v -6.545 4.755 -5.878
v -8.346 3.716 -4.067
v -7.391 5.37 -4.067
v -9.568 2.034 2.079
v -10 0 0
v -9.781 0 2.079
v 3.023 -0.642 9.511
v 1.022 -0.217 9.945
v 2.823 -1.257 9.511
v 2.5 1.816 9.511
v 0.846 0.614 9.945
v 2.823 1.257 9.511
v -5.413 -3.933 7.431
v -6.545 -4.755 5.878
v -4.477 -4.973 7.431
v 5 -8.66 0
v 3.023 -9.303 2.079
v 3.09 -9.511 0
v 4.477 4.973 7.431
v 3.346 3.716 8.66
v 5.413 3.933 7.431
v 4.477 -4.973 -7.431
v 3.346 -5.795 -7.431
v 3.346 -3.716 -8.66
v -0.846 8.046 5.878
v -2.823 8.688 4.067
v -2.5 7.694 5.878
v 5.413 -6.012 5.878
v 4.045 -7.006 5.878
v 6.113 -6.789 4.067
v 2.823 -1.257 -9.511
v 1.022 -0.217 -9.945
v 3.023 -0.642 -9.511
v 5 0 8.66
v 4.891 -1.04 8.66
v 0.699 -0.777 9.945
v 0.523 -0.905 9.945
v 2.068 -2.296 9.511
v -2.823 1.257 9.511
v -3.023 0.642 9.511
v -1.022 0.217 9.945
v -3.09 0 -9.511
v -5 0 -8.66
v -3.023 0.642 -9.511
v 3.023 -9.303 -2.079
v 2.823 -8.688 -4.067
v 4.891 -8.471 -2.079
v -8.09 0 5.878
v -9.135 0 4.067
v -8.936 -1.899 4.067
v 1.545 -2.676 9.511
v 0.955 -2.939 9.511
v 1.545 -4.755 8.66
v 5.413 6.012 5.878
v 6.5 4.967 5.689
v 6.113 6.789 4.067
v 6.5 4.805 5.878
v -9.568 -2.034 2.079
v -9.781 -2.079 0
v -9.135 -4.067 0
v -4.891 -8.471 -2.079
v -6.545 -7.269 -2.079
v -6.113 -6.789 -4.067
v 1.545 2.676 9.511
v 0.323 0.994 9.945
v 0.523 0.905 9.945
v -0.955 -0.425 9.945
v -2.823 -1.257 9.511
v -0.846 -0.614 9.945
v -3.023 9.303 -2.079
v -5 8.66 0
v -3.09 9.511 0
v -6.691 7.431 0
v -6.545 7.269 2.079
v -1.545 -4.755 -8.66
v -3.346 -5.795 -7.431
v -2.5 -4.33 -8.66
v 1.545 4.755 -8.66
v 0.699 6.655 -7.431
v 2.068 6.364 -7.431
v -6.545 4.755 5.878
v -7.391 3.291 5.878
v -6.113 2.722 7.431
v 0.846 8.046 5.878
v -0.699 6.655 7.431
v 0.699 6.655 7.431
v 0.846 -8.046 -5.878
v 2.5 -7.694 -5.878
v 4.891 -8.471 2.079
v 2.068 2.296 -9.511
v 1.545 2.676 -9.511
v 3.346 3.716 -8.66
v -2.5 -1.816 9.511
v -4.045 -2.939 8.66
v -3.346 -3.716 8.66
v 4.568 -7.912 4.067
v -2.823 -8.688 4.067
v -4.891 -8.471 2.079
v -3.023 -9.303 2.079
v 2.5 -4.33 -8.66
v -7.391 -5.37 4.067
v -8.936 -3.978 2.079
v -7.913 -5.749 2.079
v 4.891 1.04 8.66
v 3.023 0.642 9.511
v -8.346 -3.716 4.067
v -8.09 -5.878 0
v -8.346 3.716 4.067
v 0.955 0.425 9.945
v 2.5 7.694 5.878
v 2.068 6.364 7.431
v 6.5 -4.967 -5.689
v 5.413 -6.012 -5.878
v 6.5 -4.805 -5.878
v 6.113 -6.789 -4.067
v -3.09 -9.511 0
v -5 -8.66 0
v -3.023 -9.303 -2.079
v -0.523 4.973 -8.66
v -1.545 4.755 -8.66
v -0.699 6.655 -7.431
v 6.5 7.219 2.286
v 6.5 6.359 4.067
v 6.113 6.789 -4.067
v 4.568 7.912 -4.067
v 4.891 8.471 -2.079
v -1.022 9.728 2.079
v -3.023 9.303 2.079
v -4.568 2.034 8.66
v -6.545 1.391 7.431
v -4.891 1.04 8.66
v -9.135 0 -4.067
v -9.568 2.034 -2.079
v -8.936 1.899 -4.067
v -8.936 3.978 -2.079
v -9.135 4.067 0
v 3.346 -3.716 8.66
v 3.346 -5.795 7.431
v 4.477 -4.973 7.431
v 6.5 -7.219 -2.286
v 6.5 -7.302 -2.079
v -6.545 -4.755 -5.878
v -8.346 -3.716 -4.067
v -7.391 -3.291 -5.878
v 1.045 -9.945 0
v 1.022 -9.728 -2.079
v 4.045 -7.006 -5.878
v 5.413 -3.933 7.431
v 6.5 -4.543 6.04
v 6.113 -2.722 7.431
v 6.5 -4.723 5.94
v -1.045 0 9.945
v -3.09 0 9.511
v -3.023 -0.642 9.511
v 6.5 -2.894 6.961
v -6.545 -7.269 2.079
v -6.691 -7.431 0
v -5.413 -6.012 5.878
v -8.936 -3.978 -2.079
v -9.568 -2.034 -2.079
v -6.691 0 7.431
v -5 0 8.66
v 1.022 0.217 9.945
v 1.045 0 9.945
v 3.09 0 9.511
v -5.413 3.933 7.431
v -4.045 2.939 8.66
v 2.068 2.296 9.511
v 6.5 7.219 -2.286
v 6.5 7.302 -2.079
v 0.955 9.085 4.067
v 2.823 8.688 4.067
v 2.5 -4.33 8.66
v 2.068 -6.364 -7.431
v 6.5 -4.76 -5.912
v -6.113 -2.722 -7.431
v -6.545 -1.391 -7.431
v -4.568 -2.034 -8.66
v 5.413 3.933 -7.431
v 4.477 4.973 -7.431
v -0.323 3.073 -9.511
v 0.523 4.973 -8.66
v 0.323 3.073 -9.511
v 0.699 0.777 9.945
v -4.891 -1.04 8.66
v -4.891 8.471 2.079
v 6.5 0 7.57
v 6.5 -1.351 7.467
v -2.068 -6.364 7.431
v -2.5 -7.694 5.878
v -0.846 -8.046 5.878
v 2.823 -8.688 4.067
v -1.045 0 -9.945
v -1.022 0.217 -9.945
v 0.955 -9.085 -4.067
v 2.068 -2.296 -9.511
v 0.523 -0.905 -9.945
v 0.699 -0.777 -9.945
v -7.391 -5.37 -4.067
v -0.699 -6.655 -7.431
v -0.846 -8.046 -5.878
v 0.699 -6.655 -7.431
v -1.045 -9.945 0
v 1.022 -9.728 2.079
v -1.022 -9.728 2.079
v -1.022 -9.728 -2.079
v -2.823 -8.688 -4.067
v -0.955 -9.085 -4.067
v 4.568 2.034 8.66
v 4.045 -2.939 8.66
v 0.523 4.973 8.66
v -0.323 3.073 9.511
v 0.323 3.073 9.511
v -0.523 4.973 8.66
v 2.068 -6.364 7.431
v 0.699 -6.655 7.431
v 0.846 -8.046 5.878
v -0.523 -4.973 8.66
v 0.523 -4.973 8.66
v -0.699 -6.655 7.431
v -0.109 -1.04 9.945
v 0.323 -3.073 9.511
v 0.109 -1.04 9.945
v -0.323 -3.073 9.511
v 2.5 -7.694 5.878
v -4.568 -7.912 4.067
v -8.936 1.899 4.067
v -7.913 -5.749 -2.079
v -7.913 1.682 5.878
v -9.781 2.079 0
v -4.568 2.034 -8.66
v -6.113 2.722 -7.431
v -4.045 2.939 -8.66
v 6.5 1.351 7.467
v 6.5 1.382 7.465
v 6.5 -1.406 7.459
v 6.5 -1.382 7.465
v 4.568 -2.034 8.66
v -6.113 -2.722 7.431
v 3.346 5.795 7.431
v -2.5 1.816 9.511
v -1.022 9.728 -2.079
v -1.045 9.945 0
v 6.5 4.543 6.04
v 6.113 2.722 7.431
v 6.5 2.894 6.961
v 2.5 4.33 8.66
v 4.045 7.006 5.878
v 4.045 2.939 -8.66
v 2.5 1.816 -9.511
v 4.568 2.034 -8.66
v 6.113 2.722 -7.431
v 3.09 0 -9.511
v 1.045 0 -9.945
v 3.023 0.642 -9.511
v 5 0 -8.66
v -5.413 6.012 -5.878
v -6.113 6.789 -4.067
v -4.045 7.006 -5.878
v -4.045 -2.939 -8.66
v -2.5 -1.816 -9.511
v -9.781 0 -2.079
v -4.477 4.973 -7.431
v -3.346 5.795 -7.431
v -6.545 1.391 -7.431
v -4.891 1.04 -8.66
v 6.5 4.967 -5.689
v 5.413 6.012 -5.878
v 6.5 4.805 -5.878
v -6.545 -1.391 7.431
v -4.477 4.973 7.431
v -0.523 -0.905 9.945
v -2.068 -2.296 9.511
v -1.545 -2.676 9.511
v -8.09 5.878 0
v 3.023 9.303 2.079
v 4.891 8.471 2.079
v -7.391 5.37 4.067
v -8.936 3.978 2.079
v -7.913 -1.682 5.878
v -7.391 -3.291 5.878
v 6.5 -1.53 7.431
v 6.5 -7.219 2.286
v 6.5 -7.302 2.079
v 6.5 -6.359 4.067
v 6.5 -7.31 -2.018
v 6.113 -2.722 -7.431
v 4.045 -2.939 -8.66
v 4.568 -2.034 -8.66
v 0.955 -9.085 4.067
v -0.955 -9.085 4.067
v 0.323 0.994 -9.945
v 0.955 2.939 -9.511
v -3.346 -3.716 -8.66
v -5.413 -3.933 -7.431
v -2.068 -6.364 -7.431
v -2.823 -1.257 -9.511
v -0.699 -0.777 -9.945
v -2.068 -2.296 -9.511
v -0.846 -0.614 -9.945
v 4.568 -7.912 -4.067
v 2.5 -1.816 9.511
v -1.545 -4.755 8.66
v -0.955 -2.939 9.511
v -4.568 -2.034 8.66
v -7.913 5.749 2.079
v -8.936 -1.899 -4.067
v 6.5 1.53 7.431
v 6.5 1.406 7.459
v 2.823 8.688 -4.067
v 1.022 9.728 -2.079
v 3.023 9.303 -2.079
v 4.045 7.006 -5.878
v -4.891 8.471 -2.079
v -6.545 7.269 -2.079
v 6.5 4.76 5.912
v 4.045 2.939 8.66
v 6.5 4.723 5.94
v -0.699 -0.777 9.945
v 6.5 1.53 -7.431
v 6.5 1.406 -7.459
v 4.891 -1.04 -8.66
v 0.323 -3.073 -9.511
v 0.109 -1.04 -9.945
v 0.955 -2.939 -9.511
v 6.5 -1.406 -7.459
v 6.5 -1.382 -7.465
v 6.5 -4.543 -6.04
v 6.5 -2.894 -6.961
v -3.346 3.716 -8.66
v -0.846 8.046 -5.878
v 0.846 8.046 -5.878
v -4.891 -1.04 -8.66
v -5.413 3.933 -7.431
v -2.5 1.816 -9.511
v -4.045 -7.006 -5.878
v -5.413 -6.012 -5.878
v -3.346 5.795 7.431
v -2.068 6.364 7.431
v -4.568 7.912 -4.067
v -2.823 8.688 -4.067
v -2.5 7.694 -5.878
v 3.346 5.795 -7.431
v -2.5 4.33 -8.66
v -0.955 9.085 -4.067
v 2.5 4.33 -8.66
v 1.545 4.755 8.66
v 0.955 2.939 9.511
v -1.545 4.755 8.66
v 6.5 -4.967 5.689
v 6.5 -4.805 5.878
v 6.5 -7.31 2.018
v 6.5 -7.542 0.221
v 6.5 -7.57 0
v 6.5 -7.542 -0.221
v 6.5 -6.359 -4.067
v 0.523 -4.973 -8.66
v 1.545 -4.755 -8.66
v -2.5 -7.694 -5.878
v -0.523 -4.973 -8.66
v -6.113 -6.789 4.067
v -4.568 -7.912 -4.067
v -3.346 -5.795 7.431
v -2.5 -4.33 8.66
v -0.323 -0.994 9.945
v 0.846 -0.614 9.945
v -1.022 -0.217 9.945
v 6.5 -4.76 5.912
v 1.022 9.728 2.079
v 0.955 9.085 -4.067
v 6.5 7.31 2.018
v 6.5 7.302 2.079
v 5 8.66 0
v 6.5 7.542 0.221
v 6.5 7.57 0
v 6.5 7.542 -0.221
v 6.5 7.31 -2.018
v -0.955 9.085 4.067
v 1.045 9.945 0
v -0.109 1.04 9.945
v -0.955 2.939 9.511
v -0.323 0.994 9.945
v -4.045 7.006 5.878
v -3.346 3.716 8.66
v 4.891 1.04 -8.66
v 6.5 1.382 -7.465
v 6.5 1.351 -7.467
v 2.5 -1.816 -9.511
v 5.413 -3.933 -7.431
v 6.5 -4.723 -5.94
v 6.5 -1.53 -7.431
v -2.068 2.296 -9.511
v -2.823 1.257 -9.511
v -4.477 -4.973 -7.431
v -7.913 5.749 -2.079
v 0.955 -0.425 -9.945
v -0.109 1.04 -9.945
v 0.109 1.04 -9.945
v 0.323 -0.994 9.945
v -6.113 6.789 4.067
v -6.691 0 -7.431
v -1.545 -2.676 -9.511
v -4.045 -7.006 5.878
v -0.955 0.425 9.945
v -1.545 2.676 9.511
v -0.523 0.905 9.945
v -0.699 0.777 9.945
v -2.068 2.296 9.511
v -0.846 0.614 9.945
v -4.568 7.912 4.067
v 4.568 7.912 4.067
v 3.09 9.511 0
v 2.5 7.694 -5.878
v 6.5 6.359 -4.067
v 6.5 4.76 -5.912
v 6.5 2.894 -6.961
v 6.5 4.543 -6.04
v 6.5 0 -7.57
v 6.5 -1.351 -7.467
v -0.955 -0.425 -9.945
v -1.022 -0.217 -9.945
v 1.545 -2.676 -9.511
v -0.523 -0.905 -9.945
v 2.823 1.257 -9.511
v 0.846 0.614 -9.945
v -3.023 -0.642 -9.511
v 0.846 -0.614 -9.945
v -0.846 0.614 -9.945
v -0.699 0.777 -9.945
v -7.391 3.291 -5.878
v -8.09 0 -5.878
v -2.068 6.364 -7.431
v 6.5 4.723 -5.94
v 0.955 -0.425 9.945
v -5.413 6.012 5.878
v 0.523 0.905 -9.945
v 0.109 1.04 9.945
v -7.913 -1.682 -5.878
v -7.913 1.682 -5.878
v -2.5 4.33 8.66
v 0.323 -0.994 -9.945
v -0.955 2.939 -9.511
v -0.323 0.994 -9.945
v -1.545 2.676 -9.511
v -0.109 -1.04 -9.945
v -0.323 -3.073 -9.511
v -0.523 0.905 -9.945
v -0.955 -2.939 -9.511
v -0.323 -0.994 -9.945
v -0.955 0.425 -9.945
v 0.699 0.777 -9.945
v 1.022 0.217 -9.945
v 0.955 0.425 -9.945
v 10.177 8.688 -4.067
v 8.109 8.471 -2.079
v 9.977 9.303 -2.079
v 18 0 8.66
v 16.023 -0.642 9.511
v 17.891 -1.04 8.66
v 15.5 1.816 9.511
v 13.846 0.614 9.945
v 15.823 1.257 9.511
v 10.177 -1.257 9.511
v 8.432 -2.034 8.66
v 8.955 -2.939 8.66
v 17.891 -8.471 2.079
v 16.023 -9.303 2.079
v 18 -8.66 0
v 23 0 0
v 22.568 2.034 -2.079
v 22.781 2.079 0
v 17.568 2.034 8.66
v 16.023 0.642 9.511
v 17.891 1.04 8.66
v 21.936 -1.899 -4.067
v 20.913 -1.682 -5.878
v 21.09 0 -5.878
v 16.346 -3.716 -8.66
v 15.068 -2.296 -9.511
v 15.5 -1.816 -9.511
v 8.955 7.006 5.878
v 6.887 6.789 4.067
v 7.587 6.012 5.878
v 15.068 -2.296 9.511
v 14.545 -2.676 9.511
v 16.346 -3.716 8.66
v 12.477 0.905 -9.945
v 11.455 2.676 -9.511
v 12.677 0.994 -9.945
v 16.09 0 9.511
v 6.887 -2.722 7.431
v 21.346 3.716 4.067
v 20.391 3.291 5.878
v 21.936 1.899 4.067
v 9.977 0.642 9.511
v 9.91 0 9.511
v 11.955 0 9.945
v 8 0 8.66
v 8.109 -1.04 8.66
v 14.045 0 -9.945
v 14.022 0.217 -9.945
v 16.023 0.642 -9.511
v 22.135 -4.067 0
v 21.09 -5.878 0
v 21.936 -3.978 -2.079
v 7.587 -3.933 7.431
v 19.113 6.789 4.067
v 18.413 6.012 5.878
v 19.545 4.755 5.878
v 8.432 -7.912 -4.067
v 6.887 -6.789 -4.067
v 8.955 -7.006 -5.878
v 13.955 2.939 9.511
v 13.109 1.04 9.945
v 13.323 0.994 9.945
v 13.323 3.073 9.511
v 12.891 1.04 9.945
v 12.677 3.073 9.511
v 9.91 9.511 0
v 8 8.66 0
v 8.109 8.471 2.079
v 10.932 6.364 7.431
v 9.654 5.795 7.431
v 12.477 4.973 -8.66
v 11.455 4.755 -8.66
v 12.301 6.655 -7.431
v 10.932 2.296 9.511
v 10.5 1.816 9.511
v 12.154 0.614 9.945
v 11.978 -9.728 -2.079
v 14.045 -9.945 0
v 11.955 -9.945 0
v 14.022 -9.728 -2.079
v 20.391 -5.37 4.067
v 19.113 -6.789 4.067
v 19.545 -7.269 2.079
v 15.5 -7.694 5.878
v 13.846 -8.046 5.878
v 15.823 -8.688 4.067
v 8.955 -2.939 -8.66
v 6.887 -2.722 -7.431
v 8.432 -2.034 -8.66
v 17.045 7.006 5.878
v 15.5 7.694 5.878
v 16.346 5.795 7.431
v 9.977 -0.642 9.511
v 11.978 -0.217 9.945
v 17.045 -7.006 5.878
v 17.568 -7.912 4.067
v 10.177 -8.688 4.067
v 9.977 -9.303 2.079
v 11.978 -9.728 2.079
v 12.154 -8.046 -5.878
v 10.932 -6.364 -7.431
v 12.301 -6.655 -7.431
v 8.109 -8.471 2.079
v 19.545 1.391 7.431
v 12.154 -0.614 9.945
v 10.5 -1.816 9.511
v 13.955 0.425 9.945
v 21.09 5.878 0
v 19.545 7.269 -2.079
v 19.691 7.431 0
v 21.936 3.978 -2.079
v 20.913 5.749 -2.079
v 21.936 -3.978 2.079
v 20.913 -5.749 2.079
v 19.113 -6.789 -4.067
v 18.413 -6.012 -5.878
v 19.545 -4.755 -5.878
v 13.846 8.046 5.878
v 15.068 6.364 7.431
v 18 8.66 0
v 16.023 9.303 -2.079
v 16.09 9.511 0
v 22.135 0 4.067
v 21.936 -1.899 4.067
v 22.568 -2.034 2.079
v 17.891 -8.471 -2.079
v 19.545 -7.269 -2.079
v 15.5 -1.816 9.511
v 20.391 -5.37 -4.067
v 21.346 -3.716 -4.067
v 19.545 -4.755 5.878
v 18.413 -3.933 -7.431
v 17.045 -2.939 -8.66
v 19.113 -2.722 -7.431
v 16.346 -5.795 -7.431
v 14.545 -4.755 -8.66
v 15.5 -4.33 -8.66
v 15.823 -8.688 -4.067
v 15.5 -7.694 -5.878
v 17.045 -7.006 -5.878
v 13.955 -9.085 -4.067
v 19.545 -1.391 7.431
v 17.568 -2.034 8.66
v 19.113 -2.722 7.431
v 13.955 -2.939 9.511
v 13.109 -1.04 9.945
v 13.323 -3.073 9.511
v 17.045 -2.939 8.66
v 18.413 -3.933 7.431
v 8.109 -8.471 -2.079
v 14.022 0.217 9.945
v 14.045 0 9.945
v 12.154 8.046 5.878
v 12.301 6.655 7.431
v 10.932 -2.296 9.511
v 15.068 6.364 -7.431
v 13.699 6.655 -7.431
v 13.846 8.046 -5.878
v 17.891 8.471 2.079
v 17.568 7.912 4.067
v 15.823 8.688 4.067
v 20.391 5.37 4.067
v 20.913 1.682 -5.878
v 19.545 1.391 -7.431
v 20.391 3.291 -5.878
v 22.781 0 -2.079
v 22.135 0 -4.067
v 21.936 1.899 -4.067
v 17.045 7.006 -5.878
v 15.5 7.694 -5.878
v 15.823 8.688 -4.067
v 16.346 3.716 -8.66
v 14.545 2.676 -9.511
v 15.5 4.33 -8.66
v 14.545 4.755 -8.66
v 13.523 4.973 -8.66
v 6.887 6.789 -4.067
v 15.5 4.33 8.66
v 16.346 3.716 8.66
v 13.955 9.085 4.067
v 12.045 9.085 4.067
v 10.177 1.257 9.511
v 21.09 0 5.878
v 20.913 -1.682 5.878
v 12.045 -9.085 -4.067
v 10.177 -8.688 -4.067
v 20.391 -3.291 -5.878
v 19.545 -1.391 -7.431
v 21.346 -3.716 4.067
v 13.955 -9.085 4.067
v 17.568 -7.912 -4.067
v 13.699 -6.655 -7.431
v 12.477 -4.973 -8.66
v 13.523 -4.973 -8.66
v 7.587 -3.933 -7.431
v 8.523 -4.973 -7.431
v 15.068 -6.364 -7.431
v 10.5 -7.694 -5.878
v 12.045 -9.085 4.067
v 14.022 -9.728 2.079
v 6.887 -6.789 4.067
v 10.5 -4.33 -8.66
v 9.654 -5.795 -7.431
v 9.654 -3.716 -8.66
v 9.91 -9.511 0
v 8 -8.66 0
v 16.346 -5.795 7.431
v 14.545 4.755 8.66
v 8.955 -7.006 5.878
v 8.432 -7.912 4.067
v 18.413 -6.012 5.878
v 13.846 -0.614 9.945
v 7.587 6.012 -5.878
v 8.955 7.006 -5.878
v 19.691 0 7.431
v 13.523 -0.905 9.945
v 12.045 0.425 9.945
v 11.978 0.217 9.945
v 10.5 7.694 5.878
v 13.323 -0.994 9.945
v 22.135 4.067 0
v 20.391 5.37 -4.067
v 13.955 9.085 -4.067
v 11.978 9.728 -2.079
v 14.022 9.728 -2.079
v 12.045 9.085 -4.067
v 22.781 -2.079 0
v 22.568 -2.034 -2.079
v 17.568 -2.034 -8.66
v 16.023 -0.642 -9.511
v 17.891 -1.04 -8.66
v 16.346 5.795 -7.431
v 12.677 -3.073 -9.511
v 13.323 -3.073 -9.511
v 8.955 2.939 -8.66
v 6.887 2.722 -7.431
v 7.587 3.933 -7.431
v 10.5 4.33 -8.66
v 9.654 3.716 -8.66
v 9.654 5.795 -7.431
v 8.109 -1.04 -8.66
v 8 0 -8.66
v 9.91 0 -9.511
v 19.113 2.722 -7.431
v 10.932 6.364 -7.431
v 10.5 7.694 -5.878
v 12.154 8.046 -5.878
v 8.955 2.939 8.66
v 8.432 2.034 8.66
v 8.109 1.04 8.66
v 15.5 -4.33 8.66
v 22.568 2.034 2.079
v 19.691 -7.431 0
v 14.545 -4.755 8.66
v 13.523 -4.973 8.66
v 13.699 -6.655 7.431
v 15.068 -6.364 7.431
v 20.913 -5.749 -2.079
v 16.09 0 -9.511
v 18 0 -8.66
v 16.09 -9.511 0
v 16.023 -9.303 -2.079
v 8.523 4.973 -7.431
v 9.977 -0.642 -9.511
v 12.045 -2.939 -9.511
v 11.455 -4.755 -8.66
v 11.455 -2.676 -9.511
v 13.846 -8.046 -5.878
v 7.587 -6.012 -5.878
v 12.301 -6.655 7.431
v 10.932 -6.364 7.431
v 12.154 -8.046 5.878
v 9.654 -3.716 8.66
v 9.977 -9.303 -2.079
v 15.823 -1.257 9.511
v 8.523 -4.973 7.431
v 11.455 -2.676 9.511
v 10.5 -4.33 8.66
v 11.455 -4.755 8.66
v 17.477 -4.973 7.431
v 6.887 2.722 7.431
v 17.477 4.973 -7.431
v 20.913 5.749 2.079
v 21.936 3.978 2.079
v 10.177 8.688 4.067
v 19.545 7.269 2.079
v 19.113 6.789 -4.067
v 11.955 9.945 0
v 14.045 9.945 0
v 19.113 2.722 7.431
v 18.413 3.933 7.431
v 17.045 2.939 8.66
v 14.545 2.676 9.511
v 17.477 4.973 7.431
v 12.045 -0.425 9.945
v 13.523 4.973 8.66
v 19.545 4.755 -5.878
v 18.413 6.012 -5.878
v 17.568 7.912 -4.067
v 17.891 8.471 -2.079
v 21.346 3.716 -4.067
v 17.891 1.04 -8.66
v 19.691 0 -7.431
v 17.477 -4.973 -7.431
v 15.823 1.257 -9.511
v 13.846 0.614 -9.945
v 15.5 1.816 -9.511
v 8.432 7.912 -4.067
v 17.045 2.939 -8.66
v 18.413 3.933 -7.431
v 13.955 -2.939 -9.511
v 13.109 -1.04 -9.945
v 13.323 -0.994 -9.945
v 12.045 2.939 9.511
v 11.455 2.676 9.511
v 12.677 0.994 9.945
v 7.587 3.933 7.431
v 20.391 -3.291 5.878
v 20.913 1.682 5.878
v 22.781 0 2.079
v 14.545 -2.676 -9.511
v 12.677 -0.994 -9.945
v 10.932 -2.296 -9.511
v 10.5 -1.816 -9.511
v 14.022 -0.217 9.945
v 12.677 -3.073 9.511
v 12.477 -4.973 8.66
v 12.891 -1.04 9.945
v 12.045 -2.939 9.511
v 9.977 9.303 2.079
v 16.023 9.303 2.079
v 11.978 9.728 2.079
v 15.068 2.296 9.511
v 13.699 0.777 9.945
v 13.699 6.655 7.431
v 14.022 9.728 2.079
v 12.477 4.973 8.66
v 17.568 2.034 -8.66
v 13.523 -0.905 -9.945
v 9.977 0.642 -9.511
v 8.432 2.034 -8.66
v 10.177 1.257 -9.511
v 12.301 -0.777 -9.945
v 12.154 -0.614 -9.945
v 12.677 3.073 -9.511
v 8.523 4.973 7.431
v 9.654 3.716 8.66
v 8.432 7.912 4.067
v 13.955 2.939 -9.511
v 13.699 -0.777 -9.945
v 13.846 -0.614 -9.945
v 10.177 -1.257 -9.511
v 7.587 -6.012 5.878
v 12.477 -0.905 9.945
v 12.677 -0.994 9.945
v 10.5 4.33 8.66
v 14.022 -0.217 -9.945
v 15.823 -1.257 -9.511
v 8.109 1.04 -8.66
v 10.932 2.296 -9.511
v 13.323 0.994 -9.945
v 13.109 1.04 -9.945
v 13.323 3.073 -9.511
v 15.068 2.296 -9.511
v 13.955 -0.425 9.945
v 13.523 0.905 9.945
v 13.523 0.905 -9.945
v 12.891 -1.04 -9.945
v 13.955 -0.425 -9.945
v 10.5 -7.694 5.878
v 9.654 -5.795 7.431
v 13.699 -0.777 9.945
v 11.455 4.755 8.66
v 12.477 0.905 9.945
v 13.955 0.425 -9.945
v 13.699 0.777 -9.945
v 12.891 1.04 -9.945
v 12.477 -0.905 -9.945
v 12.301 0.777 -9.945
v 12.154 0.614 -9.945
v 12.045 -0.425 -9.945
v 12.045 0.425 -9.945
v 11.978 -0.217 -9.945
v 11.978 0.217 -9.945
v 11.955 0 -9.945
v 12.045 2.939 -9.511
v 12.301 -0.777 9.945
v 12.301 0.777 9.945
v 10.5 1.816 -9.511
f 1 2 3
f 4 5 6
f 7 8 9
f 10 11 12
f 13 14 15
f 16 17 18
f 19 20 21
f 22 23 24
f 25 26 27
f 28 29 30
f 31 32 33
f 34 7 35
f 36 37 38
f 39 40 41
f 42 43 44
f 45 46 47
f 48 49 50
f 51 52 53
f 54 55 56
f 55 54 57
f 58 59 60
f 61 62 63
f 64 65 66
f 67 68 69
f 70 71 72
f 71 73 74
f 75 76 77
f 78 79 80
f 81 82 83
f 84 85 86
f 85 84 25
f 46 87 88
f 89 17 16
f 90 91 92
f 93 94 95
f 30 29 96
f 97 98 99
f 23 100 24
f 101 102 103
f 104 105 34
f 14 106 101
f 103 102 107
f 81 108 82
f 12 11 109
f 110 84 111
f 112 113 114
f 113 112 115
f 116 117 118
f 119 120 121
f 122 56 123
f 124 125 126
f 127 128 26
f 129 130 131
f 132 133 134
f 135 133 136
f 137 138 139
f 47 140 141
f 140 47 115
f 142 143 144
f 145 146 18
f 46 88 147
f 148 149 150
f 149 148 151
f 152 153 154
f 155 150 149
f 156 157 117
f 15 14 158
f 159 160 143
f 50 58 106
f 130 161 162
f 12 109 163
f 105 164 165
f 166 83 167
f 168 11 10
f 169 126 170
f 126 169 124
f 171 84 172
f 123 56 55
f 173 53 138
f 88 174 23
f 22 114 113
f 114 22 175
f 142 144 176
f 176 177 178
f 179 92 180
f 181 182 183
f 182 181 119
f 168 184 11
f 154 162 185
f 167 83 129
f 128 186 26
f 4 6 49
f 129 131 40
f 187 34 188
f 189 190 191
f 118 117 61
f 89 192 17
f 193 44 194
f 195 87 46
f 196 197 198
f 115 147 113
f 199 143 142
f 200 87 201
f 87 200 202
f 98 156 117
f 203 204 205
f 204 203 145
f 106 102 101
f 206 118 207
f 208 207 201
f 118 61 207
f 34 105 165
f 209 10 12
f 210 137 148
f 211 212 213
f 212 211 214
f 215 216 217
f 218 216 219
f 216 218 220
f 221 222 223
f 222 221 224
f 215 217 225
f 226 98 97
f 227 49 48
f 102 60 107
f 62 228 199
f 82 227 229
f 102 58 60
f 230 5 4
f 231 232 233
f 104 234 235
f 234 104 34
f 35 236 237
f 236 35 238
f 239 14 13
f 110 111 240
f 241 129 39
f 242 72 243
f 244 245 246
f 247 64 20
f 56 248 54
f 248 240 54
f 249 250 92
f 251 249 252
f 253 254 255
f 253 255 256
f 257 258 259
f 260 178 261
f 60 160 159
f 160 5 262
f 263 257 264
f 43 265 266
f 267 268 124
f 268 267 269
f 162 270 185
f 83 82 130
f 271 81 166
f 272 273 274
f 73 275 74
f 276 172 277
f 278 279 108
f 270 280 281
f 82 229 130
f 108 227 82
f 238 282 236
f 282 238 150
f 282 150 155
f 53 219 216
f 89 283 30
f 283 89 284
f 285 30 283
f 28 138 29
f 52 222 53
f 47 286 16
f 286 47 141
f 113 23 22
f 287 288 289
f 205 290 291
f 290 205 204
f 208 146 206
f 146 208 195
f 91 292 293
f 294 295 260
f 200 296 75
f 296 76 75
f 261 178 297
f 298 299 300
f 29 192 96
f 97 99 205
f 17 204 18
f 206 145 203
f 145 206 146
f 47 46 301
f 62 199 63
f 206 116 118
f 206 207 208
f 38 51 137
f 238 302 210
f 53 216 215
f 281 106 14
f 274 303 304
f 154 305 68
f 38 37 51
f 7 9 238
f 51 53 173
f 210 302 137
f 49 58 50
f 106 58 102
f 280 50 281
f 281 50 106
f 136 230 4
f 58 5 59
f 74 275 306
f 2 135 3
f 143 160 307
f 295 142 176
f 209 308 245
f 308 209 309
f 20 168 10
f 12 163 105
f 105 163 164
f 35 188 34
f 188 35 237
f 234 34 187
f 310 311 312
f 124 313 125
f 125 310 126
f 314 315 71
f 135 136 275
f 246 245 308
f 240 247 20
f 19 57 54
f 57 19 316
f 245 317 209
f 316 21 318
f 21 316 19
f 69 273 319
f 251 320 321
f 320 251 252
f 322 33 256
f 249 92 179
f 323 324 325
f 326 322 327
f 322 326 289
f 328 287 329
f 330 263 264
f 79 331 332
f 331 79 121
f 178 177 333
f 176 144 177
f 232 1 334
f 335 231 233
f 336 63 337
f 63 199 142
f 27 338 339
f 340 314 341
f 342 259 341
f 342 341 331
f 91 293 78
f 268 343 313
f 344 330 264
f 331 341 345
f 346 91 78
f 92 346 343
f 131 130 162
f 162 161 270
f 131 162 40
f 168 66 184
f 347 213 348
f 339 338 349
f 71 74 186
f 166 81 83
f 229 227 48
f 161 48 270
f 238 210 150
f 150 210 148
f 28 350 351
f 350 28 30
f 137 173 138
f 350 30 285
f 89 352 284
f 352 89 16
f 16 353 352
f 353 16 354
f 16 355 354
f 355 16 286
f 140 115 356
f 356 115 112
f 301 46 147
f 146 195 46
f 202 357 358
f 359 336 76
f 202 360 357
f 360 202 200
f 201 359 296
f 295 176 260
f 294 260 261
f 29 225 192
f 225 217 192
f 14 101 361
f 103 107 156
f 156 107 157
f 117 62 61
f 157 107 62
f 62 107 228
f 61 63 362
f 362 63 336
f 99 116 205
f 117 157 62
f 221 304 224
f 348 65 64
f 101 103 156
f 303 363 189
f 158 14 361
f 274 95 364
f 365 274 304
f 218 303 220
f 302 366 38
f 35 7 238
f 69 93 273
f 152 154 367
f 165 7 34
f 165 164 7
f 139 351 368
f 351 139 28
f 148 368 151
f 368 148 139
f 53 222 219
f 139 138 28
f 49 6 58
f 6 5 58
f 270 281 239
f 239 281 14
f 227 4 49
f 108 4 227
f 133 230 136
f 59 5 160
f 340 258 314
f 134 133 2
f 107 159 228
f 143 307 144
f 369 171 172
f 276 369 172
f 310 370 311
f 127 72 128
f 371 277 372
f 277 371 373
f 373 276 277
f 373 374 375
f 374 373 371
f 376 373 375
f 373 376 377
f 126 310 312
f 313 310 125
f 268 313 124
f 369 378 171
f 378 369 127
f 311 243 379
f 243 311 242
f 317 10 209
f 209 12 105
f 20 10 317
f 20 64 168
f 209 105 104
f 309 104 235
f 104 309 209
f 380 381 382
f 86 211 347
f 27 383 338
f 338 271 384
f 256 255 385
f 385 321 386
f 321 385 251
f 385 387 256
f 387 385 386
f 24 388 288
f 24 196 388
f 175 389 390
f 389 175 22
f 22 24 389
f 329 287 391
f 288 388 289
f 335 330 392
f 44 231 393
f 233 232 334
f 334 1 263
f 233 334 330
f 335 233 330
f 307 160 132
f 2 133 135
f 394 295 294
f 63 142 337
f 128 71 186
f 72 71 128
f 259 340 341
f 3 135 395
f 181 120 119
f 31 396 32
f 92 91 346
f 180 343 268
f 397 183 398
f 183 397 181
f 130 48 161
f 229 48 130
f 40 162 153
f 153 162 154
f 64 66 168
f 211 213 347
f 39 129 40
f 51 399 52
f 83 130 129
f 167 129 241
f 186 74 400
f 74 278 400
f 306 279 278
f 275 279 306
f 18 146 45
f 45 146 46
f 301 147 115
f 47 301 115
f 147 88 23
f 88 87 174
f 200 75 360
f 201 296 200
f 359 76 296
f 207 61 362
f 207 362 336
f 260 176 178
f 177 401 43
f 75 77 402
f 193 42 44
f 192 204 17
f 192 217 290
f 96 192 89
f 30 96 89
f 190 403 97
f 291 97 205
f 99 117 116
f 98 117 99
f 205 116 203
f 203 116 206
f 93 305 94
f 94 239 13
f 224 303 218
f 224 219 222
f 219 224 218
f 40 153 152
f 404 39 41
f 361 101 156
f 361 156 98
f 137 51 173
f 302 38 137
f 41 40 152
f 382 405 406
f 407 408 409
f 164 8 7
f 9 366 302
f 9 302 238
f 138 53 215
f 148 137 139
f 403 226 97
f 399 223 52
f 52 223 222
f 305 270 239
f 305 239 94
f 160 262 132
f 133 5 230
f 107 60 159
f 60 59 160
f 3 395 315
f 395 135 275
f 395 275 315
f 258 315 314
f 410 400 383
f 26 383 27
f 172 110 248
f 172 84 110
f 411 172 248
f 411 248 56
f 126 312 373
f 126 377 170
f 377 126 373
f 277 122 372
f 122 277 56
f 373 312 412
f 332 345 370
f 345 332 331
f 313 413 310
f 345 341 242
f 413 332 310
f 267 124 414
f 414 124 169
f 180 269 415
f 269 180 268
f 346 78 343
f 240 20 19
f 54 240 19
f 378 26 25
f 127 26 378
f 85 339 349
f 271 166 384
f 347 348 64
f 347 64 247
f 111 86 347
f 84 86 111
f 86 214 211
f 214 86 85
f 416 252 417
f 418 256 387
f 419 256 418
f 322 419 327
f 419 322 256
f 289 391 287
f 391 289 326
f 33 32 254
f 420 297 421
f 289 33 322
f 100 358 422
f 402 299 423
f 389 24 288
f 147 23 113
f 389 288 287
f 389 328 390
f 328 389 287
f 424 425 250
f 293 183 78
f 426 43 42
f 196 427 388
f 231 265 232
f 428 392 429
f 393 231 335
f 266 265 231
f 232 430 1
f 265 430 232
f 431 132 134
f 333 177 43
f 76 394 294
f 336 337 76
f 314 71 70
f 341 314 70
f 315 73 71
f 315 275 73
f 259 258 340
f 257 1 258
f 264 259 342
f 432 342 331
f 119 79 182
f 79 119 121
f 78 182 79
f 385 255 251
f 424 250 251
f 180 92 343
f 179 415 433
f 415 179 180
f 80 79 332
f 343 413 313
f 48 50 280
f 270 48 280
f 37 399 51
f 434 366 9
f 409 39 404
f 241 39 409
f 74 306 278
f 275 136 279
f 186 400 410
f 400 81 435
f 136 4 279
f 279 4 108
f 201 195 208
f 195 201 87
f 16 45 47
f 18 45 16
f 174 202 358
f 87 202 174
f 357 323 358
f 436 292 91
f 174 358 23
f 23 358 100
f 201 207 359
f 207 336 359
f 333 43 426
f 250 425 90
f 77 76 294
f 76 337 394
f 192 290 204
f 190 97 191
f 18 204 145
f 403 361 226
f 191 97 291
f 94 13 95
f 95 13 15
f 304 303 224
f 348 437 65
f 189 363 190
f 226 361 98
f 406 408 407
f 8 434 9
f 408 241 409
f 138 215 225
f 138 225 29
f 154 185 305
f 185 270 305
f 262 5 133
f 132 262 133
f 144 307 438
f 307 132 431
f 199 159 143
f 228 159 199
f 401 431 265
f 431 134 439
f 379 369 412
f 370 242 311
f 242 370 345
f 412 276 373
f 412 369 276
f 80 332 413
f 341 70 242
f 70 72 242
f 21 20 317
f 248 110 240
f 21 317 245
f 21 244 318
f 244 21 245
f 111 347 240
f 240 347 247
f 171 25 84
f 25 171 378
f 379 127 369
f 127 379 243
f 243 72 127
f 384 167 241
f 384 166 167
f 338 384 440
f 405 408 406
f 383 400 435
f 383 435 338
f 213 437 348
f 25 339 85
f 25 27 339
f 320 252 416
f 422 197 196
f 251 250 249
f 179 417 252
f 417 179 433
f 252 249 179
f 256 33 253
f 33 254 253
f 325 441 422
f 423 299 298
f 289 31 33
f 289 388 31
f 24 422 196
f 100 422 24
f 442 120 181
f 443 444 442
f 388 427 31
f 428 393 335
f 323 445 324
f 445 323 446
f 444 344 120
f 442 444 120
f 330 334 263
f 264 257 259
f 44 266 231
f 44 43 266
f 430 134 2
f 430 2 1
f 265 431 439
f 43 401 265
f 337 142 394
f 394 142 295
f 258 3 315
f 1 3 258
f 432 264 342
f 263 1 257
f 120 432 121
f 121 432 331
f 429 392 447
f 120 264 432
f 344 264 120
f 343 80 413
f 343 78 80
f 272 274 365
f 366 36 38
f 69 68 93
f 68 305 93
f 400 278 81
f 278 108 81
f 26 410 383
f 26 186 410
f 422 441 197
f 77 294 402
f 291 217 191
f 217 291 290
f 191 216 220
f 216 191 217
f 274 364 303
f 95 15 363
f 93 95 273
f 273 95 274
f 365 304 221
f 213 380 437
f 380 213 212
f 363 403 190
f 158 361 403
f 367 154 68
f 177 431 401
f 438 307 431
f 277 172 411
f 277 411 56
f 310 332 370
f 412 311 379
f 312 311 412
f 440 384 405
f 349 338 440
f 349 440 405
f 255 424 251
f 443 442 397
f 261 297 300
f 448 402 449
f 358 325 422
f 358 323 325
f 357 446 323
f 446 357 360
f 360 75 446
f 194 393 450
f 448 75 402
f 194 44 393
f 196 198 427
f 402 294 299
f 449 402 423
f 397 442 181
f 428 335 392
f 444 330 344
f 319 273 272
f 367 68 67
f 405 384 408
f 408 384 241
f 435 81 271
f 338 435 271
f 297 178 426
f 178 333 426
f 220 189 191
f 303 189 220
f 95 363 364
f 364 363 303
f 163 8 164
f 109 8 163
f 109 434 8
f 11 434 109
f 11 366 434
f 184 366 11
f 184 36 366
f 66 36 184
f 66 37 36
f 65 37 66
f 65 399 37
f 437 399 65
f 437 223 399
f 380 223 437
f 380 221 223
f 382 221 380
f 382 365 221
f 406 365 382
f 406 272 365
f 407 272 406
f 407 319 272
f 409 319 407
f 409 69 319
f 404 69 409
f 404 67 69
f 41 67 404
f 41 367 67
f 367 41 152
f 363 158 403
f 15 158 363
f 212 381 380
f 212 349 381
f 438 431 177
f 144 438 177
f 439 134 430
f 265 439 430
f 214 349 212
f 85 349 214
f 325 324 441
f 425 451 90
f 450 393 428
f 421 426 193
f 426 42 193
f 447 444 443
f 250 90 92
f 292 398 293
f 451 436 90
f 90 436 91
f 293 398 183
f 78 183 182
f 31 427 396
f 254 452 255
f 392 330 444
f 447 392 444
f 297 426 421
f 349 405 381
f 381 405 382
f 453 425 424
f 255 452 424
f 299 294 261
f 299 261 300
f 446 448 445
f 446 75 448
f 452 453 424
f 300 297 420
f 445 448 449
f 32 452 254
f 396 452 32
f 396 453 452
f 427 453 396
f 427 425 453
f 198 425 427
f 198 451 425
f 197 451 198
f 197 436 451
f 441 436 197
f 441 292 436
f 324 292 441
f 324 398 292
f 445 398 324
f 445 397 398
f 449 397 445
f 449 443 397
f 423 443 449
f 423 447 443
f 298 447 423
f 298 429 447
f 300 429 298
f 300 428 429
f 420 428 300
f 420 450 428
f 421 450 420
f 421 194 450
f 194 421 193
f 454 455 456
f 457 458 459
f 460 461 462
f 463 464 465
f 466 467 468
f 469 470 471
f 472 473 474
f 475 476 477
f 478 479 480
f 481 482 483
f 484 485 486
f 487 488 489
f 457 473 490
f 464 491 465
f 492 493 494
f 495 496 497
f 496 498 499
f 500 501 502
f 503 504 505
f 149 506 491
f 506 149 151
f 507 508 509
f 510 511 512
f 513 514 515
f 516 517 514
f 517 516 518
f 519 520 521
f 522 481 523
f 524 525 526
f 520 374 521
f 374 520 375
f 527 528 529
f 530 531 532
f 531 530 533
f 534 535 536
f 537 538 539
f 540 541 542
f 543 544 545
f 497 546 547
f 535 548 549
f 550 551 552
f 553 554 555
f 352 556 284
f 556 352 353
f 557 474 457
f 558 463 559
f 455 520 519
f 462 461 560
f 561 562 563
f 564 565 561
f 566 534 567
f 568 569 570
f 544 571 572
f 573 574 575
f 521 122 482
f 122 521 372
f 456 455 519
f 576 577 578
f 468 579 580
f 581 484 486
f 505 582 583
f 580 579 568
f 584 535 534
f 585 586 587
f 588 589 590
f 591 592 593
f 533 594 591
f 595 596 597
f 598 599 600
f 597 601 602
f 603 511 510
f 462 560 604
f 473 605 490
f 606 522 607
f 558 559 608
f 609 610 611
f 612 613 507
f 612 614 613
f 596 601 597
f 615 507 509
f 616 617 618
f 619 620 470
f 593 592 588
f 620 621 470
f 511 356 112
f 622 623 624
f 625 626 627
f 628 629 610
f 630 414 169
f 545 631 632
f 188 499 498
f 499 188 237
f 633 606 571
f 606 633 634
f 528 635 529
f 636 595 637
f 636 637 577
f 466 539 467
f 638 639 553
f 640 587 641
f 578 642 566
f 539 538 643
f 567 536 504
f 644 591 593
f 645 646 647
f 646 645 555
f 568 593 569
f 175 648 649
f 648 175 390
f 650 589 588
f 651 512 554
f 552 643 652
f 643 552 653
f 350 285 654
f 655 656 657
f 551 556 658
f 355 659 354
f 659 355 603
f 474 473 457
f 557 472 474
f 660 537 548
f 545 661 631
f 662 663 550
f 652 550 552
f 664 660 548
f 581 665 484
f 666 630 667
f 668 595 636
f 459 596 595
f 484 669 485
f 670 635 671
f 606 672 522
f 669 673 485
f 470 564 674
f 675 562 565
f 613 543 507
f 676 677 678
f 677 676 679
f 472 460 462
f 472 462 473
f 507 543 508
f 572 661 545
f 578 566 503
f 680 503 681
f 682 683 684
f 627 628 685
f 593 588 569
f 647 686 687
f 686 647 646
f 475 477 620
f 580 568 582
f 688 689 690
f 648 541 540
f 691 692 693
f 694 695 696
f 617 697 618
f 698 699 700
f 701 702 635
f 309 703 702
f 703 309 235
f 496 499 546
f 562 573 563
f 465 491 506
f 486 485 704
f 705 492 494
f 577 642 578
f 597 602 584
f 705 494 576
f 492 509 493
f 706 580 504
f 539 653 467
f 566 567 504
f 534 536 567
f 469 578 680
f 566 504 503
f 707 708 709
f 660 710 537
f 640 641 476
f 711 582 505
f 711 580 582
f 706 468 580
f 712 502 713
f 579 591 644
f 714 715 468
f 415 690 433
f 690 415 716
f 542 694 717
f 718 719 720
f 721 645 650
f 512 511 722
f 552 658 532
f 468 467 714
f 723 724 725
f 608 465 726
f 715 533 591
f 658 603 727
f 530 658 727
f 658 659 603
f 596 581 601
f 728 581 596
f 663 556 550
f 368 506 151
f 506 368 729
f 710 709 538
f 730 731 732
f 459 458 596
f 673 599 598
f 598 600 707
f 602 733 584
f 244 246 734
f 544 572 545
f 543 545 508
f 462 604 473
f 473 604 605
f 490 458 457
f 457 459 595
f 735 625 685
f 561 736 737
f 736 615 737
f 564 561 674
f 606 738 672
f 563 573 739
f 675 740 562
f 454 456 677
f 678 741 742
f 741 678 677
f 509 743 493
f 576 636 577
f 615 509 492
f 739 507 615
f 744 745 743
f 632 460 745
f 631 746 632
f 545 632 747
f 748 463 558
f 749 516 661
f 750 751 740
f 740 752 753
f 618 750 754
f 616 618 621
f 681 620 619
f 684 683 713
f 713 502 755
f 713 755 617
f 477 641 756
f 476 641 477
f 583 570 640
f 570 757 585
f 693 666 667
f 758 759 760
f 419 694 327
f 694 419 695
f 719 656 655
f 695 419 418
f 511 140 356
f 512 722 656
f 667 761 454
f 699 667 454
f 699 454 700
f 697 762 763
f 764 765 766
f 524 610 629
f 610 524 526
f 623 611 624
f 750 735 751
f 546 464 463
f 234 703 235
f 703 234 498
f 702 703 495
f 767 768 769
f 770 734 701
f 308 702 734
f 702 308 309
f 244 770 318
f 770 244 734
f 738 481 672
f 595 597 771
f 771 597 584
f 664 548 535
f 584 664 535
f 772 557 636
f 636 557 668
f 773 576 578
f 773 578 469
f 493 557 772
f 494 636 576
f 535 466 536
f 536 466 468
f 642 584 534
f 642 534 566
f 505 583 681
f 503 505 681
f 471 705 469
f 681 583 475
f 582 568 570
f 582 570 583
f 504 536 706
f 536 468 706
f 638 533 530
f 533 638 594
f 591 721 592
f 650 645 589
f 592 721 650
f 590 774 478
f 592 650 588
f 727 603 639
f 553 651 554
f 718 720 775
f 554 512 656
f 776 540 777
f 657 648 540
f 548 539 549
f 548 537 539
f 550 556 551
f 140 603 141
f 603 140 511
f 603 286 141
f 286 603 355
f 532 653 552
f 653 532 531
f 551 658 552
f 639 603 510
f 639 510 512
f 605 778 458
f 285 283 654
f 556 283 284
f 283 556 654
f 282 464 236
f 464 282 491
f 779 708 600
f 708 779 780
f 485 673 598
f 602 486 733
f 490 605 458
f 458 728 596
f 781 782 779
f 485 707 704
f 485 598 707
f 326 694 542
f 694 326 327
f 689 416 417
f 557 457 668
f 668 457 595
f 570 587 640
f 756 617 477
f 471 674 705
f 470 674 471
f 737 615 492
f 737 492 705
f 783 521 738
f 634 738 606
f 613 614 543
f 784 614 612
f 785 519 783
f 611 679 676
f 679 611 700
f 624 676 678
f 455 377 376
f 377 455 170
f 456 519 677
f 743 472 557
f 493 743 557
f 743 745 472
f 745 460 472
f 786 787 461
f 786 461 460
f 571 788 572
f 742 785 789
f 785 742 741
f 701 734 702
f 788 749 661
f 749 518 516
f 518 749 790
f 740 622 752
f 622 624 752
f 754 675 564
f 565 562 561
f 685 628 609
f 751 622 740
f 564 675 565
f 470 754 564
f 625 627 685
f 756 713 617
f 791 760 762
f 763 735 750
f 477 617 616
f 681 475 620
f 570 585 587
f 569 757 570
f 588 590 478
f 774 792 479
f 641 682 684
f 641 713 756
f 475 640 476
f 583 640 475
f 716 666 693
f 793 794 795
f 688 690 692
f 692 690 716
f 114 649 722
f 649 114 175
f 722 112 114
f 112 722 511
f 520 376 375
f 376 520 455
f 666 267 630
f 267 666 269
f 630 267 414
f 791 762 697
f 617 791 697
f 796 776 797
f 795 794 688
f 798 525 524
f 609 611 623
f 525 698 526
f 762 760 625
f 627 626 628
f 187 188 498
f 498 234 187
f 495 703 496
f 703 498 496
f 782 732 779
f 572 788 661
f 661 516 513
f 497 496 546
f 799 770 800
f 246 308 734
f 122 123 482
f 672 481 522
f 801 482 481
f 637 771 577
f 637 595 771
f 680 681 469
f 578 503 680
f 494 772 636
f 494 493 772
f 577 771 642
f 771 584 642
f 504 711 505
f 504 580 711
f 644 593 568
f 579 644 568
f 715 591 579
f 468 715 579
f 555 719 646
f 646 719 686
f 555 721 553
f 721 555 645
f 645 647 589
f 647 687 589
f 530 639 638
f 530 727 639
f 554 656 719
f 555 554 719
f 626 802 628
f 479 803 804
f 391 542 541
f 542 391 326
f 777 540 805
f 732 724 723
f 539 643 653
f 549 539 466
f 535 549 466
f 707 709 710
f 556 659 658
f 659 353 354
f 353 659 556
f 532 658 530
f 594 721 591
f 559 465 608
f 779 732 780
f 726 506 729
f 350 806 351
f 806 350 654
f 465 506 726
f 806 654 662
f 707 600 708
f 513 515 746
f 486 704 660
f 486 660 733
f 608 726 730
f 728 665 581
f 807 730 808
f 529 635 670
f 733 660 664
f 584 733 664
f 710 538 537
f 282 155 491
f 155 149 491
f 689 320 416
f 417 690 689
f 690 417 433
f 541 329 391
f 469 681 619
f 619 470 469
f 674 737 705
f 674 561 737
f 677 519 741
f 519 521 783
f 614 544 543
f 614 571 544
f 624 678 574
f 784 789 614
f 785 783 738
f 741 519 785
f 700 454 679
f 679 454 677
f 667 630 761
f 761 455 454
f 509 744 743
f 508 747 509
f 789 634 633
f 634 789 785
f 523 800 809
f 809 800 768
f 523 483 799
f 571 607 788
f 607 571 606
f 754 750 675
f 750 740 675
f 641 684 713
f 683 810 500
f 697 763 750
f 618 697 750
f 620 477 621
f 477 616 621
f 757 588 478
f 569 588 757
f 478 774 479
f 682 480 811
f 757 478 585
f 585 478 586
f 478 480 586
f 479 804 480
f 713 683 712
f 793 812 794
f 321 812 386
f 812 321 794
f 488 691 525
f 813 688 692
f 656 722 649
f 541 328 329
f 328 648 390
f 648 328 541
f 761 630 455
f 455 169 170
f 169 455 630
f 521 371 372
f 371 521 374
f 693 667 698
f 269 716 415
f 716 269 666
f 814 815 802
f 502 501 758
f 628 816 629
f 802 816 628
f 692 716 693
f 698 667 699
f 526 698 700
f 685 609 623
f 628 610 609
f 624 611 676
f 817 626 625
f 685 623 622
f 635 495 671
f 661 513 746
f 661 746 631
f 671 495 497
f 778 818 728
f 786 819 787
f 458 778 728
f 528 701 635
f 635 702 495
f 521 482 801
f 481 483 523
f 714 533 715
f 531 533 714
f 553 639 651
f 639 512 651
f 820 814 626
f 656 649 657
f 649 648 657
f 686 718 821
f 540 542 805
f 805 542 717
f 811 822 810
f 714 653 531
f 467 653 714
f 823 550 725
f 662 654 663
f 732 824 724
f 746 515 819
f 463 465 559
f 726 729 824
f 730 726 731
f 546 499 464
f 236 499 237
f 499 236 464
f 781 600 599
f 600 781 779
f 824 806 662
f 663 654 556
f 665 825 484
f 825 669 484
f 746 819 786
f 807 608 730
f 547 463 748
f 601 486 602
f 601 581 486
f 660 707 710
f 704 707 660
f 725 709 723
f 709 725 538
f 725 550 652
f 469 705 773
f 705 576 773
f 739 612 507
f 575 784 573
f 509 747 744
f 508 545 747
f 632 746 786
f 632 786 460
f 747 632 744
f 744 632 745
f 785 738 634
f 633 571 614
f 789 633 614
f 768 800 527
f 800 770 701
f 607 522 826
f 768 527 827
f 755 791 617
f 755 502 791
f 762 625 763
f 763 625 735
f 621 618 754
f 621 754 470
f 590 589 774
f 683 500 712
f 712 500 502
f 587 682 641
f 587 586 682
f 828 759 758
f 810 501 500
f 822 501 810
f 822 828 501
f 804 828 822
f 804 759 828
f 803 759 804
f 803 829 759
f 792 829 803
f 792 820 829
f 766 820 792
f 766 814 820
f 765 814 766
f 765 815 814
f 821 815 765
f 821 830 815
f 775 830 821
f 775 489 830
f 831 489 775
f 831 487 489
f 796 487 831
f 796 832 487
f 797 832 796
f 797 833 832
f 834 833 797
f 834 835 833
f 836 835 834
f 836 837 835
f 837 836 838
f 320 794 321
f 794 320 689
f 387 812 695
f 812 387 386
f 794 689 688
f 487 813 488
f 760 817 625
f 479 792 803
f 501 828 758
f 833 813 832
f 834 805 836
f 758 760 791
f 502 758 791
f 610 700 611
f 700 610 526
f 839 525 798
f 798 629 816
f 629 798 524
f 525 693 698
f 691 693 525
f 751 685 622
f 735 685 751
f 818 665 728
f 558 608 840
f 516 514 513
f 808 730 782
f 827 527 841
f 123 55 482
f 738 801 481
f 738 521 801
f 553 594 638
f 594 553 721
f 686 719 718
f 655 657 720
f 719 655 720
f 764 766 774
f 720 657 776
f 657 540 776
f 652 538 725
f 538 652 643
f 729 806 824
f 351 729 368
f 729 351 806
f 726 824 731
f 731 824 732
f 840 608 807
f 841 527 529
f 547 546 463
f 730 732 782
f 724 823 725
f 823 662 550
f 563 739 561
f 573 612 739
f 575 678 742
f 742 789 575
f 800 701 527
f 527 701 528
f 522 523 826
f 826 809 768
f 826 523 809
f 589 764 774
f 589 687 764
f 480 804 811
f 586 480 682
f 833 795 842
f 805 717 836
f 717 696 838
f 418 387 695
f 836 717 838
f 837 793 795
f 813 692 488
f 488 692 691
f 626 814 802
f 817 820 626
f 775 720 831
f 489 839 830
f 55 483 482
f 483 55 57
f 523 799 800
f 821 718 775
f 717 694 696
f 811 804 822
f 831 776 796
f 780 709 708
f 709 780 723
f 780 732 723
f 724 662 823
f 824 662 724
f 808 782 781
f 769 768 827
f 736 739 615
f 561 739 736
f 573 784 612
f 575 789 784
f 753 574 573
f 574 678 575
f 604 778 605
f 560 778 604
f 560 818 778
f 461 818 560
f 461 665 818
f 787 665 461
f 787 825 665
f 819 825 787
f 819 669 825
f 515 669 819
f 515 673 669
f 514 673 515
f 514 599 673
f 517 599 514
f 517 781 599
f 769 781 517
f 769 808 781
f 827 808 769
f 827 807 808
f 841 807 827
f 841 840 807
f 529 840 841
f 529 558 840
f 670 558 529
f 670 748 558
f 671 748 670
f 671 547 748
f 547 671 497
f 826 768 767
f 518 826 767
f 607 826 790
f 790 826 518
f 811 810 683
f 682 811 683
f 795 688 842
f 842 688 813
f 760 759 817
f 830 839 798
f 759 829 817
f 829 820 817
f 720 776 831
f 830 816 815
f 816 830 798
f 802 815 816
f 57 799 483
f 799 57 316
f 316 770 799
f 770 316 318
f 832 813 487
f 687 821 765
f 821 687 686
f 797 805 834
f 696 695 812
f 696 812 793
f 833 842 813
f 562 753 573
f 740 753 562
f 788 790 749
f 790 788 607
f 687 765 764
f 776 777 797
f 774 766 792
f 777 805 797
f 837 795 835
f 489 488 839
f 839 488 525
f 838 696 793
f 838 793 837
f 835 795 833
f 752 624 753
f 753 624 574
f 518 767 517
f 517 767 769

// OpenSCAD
difference() {
  sphere(r=10);
  %#cylinder(h=30, r=6, center=true);
}
translate([13,0,0]) difference() {
  sphere(r=10);
  #%cylinder(h=30, r=6, center=true);
}
